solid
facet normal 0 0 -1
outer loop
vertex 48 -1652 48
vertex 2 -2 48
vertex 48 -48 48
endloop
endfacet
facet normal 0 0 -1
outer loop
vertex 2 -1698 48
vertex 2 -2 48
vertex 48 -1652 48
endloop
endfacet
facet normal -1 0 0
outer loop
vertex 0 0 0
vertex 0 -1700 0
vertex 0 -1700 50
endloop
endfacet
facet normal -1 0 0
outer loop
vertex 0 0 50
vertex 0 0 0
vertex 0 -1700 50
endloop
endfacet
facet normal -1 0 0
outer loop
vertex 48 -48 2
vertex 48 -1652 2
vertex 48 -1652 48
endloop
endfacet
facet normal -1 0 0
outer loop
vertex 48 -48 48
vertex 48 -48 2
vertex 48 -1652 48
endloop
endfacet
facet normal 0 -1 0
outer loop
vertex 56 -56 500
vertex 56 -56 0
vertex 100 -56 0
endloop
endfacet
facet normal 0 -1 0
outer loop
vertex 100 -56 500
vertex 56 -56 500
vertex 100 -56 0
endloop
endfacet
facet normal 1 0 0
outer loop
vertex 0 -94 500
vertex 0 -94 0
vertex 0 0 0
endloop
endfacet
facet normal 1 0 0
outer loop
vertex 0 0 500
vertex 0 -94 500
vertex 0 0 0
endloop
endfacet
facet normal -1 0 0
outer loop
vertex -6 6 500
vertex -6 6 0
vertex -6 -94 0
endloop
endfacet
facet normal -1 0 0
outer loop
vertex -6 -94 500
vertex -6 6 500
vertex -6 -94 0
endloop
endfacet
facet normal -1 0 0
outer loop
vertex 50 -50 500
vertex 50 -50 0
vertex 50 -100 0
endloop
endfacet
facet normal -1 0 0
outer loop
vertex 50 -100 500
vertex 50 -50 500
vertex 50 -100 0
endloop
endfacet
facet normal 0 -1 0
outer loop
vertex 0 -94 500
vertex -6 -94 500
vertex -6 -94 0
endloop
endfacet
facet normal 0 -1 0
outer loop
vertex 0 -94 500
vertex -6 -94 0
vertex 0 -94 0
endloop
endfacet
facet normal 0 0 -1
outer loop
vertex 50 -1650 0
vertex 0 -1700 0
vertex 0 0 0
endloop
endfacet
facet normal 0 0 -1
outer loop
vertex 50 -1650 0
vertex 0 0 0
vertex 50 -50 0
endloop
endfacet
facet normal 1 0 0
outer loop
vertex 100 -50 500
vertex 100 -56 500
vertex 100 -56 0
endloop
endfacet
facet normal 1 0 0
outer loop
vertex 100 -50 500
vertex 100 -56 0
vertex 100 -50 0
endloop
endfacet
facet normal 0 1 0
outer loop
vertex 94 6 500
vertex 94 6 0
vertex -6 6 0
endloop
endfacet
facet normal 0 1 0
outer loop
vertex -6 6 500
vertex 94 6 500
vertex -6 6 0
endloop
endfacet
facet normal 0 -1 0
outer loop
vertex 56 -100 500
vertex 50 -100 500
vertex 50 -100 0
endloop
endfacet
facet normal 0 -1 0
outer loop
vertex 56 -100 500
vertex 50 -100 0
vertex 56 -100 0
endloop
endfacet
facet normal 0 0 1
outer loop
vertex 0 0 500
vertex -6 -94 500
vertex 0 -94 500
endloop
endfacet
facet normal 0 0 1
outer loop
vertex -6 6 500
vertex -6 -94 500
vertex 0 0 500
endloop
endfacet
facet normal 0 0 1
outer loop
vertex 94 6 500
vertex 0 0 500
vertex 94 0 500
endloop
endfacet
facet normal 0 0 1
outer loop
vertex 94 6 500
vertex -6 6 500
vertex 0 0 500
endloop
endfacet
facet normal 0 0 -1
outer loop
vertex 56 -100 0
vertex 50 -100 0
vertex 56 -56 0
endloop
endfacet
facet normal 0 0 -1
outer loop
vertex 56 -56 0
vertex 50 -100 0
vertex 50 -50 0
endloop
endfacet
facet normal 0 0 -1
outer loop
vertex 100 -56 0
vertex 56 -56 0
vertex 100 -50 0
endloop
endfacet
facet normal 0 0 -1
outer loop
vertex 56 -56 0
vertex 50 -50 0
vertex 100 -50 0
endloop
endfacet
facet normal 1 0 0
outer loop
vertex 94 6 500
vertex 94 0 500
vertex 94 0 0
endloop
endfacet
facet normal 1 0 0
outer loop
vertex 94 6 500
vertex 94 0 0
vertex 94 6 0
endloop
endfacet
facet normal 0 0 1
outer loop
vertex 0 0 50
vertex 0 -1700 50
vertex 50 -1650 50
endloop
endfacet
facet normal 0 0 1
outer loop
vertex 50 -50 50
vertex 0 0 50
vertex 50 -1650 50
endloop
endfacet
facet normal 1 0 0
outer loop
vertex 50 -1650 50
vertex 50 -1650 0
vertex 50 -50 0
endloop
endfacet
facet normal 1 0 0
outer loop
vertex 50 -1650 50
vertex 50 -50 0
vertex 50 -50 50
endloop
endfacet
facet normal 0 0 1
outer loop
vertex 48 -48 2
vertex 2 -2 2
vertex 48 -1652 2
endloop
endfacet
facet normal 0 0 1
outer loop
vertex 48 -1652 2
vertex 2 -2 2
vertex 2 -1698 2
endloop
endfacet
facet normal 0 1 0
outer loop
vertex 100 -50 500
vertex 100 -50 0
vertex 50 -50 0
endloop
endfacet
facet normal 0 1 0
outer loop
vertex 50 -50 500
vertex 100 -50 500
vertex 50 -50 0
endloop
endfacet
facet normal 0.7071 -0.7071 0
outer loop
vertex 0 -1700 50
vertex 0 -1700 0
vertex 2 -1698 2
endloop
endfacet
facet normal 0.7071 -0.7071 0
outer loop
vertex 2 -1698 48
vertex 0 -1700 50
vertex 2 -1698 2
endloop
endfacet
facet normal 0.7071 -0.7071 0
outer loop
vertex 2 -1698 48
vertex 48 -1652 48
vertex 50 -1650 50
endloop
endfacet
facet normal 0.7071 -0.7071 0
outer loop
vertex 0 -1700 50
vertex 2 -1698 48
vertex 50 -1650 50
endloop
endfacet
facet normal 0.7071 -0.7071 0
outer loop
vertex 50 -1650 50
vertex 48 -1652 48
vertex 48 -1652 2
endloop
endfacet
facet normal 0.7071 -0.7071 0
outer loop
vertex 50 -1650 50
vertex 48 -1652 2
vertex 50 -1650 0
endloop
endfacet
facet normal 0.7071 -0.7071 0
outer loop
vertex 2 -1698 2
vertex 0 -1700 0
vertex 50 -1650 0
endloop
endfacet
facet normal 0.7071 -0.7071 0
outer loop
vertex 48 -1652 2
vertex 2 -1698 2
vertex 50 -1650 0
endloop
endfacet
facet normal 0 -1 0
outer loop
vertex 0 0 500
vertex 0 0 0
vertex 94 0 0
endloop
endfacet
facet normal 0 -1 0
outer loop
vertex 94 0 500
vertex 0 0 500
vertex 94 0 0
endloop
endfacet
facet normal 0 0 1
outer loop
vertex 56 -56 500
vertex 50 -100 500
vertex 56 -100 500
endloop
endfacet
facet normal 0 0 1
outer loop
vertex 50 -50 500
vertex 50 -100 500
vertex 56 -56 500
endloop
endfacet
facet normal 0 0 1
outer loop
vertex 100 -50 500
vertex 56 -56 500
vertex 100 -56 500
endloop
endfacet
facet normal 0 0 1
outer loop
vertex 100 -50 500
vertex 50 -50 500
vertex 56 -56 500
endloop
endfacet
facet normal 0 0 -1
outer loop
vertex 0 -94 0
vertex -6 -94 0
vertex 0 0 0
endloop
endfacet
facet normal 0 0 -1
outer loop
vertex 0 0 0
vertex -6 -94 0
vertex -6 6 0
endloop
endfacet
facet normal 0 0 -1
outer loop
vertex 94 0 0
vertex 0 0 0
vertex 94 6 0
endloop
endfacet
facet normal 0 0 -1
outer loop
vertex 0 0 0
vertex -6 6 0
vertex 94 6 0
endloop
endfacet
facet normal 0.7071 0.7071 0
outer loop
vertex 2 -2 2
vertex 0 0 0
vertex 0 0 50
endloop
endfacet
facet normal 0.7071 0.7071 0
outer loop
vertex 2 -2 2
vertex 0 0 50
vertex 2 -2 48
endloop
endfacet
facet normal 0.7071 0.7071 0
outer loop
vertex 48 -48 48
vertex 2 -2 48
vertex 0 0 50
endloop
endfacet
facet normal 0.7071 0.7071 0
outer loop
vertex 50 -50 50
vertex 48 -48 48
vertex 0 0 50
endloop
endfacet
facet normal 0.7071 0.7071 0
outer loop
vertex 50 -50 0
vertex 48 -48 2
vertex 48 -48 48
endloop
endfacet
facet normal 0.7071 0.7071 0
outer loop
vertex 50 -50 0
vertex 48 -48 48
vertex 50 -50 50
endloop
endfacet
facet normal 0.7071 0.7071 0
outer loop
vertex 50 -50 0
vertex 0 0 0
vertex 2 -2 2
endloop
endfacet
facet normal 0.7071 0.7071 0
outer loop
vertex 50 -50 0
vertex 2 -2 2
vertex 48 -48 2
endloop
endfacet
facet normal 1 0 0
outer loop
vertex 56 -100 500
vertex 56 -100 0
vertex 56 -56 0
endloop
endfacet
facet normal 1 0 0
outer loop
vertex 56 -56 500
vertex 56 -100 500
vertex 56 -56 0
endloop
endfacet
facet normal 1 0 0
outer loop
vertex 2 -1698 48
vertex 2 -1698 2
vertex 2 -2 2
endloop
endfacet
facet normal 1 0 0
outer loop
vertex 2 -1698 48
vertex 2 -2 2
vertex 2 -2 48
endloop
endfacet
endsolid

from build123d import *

# Parameters (mm, degrees)
F5_DEPTH = 50
F4_W     = 50
F4_H     = 50
F4_W_2   = 46
F4_H_2   = 46
F1_DEPTH = 850
F3_W     = 6
F3_H     = 6
F7_DEPTH = 500


# Not quite as in the source:
# - a feature names something its author has since deleted; it is built from what else it names


with BuildPart() as f5:
    # F0 (on Top) → F5 (new body)
    with BuildSketch(Plane.XY):
        Polygon((51, 0), (0, 0), (25.5, -25.5), align=None)
        Polygon((51, -51), (51, 0), (25.5, -25.5), align=None)
    extrude(amount=F5_DEPTH)


with BuildPart() as f1:
    # F4 (on Front) → F1 (new body)
    with BuildSketch(Plane.XZ):
        with Locations((25, 25)):
            Rectangle(F4_W, F4_H)
        with Locations((25, 25)):
            Rectangle(F4_W_2, F4_H_2, mode=Mode.SUBTRACT)
    extrude(amount=F1_DEPTH)

    # F2: cut F5
    add(f5.part, mode=Mode.SUBTRACT)

    # F6: F1 across face


with BuildPart() as f1_1:
    add(f1.part)
    add(f1.part.mirror(Plane(origin=(25, -850, 25), x_dir=(1, 0, 0), z_dir=(0, -1, 0))))


with BuildPart() as f7:
    # F3 (on Top) → F7 (new body)
    with BuildSketch(Plane.XY):
        Polygon((94, -56), (94, -50), (50, -50), (50, -94), (56, -94), (56, -56), align=None)
        with Locations((53, -97)):
            Rectangle(F3_W, F3_H)
        with Locations((97, -53)):
            Rectangle(F3_W, F3_H)
    extrude(amount=F7_DEPTH)


with BuildPart() as f7b:
    # F3 (on Top) → F7, piece 2 (new body)
    with BuildSketch(Plane.XY):
        Polygon((0, -94), (0, 0), (94, 0), (94, 6), (-6, 6), (-6, -94), align=None)
    extrude(amount=F7_DEPTH)


solid = Compound([f1_1.part, f7.part, f7b.part])
